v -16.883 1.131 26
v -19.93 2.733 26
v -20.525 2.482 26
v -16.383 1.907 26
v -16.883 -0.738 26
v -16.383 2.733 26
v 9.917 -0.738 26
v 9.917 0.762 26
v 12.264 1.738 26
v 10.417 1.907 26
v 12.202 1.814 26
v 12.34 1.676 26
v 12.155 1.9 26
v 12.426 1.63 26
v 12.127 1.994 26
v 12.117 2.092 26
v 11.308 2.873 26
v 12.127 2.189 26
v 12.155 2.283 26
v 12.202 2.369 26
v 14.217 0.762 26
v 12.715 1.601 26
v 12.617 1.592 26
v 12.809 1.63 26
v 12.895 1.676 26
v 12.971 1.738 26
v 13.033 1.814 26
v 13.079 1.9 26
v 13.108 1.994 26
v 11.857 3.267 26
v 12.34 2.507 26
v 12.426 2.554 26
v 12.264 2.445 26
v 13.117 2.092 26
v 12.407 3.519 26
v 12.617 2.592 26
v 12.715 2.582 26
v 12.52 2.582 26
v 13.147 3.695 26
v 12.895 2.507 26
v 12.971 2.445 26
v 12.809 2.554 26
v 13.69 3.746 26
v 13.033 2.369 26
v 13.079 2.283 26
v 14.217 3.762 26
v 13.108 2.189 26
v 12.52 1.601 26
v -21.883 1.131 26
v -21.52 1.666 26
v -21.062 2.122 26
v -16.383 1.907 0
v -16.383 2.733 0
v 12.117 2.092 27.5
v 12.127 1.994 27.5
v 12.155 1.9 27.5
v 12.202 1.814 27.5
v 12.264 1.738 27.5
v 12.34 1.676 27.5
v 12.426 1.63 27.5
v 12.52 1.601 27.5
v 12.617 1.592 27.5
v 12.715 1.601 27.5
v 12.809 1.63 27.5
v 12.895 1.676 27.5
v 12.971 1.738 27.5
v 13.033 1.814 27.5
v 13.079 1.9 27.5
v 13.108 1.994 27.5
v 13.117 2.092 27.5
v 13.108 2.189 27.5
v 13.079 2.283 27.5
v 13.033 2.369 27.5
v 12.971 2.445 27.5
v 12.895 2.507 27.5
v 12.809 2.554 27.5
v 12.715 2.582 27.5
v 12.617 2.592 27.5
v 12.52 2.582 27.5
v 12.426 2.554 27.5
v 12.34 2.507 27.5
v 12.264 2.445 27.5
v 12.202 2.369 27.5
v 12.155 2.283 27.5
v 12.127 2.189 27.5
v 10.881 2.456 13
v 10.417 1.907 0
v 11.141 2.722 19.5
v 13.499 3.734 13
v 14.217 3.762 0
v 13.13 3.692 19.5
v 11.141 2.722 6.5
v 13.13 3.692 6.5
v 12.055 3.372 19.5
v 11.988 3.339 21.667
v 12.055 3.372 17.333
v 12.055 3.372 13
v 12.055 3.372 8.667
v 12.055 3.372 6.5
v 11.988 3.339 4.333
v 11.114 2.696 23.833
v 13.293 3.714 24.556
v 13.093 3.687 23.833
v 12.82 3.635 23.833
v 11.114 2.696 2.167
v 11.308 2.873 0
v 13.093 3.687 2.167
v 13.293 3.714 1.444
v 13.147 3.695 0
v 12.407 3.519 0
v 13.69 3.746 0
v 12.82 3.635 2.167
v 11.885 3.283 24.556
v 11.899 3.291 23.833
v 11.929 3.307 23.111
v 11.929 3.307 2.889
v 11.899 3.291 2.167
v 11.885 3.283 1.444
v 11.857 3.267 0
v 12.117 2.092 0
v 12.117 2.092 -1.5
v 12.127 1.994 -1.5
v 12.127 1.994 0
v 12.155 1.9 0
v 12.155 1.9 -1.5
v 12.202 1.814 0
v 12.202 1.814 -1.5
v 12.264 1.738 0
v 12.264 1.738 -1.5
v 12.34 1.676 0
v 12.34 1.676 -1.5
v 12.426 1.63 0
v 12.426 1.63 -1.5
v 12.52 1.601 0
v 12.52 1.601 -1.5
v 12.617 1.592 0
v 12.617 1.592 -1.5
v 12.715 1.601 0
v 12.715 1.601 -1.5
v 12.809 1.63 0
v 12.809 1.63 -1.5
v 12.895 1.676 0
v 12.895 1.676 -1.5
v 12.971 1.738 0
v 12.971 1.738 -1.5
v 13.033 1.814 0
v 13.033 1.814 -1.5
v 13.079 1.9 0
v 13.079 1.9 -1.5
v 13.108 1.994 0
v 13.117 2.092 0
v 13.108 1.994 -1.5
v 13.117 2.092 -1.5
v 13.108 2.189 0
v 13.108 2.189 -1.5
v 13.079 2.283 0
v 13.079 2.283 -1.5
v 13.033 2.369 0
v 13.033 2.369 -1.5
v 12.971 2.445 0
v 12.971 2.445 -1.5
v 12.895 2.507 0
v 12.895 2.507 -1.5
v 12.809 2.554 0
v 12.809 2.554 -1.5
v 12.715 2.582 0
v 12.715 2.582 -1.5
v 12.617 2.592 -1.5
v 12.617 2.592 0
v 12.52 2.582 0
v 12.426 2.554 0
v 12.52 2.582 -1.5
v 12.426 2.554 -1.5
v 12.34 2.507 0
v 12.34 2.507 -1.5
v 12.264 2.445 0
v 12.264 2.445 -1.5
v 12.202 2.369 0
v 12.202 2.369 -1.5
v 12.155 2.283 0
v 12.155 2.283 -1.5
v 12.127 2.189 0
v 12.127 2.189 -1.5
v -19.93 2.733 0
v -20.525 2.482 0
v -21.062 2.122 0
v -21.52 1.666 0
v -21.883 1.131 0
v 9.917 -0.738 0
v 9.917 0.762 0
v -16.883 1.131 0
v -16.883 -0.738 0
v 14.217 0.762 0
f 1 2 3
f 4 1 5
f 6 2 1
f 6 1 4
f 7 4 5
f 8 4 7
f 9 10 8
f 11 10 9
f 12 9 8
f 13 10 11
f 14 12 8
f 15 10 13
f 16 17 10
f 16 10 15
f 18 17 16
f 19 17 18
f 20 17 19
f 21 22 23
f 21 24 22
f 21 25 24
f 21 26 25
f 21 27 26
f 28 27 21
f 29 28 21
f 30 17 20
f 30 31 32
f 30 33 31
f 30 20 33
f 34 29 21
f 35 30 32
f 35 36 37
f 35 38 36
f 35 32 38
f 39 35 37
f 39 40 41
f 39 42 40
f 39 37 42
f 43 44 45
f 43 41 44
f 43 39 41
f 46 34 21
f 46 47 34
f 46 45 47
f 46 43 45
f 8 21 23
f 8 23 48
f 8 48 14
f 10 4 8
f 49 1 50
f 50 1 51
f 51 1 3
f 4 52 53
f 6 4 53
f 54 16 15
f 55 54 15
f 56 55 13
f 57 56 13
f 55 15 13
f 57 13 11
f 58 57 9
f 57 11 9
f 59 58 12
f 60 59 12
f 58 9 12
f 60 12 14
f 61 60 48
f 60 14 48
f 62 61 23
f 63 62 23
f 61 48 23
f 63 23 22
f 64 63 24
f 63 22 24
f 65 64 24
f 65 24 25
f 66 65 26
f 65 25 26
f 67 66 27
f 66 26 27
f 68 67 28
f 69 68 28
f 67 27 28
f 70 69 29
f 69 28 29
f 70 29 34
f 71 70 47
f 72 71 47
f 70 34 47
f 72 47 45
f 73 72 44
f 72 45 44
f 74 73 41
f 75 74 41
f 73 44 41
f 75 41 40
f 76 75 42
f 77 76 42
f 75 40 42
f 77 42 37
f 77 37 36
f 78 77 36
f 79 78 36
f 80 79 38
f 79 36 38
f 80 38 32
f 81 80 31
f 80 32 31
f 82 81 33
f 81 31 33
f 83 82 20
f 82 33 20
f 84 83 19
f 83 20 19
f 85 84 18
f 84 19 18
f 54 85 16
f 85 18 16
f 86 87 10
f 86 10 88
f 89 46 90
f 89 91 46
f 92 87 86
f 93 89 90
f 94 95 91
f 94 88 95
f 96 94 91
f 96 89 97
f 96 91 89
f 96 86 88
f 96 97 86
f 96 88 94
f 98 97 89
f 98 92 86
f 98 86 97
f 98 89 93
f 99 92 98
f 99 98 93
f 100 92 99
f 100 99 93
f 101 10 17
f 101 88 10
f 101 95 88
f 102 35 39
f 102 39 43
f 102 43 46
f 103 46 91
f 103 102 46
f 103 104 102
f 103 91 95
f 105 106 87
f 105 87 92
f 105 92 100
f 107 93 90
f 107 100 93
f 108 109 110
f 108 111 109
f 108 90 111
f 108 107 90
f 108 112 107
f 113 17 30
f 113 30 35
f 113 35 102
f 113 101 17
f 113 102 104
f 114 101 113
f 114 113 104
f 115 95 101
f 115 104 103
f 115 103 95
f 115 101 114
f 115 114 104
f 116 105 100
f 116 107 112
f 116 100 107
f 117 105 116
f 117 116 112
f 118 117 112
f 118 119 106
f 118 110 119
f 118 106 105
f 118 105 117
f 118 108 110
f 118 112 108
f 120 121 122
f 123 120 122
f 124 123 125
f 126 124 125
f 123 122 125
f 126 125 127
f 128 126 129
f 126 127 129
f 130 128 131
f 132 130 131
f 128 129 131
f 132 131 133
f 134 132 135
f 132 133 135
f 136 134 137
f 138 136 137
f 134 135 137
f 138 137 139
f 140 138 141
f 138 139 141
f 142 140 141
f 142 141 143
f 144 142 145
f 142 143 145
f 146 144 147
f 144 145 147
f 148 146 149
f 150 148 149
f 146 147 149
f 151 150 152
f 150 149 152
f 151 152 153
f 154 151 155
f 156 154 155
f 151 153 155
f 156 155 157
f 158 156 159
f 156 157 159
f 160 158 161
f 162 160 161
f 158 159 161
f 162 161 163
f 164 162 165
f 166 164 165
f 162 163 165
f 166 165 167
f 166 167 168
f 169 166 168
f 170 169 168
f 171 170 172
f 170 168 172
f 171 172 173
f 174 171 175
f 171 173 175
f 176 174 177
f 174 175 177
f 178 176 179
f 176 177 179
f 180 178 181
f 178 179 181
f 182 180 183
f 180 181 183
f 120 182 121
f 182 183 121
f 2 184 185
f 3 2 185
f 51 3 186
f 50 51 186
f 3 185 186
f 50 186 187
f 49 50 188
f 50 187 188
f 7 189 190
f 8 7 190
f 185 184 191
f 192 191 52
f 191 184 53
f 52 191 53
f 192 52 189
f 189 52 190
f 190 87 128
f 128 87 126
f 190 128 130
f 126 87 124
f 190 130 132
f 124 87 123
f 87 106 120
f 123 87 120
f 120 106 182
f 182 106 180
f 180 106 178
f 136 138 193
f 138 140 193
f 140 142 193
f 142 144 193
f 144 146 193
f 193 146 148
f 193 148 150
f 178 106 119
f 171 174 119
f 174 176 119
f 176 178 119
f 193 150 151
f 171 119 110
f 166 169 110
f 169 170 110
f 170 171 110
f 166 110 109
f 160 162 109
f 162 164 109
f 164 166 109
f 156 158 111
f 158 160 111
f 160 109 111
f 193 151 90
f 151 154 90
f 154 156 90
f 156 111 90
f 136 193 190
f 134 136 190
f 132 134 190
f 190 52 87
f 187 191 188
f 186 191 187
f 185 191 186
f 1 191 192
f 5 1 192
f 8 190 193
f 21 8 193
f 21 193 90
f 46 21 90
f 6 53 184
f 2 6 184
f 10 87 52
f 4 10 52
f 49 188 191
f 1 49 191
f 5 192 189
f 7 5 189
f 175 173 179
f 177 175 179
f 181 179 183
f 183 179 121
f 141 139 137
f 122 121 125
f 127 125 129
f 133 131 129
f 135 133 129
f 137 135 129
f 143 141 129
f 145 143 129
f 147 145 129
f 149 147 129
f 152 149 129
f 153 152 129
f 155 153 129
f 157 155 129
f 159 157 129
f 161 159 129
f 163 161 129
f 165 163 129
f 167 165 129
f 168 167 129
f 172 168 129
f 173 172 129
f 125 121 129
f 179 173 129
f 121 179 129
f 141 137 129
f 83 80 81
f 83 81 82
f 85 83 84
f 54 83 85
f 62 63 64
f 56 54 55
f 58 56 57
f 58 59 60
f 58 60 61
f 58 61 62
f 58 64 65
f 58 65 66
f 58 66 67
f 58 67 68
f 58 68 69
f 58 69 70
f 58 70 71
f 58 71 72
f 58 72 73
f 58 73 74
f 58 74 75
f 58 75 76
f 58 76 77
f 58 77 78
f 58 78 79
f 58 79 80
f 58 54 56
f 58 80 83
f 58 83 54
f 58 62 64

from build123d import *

# Parameters (mm, degrees)
BOSS_EXTRUDE3_DEPTH = 26
FILLET6_DEPTH       = 26
SKETCH6_R           = 0.5
BOSS_EXTRUDE6_DEPTH = 1.5
LPATTERN1_COUNT     = 2
LPATTERN1_PITCH     = 27.5


with BuildPart() as part:
    # Sketch4 → Boss-Extrude3 (new body)
    with BuildSketch(Plane.XY):
        with BuildLine():
            Line((-16.882676832, -0.738323828), (9.917323168, -0.738323828))
            Line((9.917323168, -0.738323828), (9.917323168, 0.761676172))
            Line((9.917323168, 0.761676172), (14.217323168, 0.761676172))
            Line((14.217323168, 0.761676172), (14.217323168, 3.761676172))
            Line((14.217323168, 3.761676172), (10.417323168, 3.761676172))
            Line((10.417323168, 3.761676172), (10.417323168, 1.907320096))
            Line((10.417323168, 1.907320096), (-16.382676832, 1.907320096))
            Line((-16.382676832, 1.907320096), (-16.382676832, 2.732812963))
            Line((-16.382676832, 2.732812963), (-19.929938074, 2.732812963))
            ThreePointArc((-19.929938074, 2.732812963), (-21.061793852, 2.121559656), (-21.882676832, 1.131166179))
            Line((-21.882676832, 1.131166179), (-16.882676832, 1.131166179))
            Line((-16.882676832, 1.131166179), (-16.882676832, -0.738323828))
        make_face()
    extrude(amount=BOSS_EXTRUDE3_DEPTH)

    # Fillet6: read off the stored shape, not the designer's step
    # Fillet6 outline → Fillet6 (cut)
    with BuildSketch(Plane.XY):
        with BuildLine():
            Line((10.417323168, 3.761676172), (10.417323168, 1.907320096))
            add(Edge.make_bspline(
                [(10.417323168, 1.907320096), (10.684335221, 2.237350554), (10.951347275, 2.567381012), (11.617088855, 3.247333717), (12.422778443, 3.640500924), (13.36841604, 3.74688263), (13.792869604, 3.754279401), (14.217323168, 3.761676172)],
                knots=[0, 0, 0, 0, 0, 0, 0.5, 0.5, 1, 1, 1, 1, 1, 1], degree=5))
            Line((14.217323168, 3.761676172), (10.417323168, 3.761676172))
        make_face()
    extrude(amount=FILLET6_DEPTH, mode=Mode.SUBTRACT)

    # Sketch6 → Boss-Extrude6 (add)
    with BuildSketch(Plane.XY.offset(26)):
        with Locations(Location((12.617323168, 2.091676172, 0), (0, 0, 180))):
            Circle(SKETCH6_R)
    boss_extrude6 = extrude(amount=BOSS_EXTRUDE6_DEPTH)

    # LPattern1: Boss-Extrude6 ×2
    with Locations(*[(0, 0, -i * LPATTERN1_PITCH) for i in range(1, LPATTERN1_COUNT)]):
        add(boss_extrude6)


solid = part.part
